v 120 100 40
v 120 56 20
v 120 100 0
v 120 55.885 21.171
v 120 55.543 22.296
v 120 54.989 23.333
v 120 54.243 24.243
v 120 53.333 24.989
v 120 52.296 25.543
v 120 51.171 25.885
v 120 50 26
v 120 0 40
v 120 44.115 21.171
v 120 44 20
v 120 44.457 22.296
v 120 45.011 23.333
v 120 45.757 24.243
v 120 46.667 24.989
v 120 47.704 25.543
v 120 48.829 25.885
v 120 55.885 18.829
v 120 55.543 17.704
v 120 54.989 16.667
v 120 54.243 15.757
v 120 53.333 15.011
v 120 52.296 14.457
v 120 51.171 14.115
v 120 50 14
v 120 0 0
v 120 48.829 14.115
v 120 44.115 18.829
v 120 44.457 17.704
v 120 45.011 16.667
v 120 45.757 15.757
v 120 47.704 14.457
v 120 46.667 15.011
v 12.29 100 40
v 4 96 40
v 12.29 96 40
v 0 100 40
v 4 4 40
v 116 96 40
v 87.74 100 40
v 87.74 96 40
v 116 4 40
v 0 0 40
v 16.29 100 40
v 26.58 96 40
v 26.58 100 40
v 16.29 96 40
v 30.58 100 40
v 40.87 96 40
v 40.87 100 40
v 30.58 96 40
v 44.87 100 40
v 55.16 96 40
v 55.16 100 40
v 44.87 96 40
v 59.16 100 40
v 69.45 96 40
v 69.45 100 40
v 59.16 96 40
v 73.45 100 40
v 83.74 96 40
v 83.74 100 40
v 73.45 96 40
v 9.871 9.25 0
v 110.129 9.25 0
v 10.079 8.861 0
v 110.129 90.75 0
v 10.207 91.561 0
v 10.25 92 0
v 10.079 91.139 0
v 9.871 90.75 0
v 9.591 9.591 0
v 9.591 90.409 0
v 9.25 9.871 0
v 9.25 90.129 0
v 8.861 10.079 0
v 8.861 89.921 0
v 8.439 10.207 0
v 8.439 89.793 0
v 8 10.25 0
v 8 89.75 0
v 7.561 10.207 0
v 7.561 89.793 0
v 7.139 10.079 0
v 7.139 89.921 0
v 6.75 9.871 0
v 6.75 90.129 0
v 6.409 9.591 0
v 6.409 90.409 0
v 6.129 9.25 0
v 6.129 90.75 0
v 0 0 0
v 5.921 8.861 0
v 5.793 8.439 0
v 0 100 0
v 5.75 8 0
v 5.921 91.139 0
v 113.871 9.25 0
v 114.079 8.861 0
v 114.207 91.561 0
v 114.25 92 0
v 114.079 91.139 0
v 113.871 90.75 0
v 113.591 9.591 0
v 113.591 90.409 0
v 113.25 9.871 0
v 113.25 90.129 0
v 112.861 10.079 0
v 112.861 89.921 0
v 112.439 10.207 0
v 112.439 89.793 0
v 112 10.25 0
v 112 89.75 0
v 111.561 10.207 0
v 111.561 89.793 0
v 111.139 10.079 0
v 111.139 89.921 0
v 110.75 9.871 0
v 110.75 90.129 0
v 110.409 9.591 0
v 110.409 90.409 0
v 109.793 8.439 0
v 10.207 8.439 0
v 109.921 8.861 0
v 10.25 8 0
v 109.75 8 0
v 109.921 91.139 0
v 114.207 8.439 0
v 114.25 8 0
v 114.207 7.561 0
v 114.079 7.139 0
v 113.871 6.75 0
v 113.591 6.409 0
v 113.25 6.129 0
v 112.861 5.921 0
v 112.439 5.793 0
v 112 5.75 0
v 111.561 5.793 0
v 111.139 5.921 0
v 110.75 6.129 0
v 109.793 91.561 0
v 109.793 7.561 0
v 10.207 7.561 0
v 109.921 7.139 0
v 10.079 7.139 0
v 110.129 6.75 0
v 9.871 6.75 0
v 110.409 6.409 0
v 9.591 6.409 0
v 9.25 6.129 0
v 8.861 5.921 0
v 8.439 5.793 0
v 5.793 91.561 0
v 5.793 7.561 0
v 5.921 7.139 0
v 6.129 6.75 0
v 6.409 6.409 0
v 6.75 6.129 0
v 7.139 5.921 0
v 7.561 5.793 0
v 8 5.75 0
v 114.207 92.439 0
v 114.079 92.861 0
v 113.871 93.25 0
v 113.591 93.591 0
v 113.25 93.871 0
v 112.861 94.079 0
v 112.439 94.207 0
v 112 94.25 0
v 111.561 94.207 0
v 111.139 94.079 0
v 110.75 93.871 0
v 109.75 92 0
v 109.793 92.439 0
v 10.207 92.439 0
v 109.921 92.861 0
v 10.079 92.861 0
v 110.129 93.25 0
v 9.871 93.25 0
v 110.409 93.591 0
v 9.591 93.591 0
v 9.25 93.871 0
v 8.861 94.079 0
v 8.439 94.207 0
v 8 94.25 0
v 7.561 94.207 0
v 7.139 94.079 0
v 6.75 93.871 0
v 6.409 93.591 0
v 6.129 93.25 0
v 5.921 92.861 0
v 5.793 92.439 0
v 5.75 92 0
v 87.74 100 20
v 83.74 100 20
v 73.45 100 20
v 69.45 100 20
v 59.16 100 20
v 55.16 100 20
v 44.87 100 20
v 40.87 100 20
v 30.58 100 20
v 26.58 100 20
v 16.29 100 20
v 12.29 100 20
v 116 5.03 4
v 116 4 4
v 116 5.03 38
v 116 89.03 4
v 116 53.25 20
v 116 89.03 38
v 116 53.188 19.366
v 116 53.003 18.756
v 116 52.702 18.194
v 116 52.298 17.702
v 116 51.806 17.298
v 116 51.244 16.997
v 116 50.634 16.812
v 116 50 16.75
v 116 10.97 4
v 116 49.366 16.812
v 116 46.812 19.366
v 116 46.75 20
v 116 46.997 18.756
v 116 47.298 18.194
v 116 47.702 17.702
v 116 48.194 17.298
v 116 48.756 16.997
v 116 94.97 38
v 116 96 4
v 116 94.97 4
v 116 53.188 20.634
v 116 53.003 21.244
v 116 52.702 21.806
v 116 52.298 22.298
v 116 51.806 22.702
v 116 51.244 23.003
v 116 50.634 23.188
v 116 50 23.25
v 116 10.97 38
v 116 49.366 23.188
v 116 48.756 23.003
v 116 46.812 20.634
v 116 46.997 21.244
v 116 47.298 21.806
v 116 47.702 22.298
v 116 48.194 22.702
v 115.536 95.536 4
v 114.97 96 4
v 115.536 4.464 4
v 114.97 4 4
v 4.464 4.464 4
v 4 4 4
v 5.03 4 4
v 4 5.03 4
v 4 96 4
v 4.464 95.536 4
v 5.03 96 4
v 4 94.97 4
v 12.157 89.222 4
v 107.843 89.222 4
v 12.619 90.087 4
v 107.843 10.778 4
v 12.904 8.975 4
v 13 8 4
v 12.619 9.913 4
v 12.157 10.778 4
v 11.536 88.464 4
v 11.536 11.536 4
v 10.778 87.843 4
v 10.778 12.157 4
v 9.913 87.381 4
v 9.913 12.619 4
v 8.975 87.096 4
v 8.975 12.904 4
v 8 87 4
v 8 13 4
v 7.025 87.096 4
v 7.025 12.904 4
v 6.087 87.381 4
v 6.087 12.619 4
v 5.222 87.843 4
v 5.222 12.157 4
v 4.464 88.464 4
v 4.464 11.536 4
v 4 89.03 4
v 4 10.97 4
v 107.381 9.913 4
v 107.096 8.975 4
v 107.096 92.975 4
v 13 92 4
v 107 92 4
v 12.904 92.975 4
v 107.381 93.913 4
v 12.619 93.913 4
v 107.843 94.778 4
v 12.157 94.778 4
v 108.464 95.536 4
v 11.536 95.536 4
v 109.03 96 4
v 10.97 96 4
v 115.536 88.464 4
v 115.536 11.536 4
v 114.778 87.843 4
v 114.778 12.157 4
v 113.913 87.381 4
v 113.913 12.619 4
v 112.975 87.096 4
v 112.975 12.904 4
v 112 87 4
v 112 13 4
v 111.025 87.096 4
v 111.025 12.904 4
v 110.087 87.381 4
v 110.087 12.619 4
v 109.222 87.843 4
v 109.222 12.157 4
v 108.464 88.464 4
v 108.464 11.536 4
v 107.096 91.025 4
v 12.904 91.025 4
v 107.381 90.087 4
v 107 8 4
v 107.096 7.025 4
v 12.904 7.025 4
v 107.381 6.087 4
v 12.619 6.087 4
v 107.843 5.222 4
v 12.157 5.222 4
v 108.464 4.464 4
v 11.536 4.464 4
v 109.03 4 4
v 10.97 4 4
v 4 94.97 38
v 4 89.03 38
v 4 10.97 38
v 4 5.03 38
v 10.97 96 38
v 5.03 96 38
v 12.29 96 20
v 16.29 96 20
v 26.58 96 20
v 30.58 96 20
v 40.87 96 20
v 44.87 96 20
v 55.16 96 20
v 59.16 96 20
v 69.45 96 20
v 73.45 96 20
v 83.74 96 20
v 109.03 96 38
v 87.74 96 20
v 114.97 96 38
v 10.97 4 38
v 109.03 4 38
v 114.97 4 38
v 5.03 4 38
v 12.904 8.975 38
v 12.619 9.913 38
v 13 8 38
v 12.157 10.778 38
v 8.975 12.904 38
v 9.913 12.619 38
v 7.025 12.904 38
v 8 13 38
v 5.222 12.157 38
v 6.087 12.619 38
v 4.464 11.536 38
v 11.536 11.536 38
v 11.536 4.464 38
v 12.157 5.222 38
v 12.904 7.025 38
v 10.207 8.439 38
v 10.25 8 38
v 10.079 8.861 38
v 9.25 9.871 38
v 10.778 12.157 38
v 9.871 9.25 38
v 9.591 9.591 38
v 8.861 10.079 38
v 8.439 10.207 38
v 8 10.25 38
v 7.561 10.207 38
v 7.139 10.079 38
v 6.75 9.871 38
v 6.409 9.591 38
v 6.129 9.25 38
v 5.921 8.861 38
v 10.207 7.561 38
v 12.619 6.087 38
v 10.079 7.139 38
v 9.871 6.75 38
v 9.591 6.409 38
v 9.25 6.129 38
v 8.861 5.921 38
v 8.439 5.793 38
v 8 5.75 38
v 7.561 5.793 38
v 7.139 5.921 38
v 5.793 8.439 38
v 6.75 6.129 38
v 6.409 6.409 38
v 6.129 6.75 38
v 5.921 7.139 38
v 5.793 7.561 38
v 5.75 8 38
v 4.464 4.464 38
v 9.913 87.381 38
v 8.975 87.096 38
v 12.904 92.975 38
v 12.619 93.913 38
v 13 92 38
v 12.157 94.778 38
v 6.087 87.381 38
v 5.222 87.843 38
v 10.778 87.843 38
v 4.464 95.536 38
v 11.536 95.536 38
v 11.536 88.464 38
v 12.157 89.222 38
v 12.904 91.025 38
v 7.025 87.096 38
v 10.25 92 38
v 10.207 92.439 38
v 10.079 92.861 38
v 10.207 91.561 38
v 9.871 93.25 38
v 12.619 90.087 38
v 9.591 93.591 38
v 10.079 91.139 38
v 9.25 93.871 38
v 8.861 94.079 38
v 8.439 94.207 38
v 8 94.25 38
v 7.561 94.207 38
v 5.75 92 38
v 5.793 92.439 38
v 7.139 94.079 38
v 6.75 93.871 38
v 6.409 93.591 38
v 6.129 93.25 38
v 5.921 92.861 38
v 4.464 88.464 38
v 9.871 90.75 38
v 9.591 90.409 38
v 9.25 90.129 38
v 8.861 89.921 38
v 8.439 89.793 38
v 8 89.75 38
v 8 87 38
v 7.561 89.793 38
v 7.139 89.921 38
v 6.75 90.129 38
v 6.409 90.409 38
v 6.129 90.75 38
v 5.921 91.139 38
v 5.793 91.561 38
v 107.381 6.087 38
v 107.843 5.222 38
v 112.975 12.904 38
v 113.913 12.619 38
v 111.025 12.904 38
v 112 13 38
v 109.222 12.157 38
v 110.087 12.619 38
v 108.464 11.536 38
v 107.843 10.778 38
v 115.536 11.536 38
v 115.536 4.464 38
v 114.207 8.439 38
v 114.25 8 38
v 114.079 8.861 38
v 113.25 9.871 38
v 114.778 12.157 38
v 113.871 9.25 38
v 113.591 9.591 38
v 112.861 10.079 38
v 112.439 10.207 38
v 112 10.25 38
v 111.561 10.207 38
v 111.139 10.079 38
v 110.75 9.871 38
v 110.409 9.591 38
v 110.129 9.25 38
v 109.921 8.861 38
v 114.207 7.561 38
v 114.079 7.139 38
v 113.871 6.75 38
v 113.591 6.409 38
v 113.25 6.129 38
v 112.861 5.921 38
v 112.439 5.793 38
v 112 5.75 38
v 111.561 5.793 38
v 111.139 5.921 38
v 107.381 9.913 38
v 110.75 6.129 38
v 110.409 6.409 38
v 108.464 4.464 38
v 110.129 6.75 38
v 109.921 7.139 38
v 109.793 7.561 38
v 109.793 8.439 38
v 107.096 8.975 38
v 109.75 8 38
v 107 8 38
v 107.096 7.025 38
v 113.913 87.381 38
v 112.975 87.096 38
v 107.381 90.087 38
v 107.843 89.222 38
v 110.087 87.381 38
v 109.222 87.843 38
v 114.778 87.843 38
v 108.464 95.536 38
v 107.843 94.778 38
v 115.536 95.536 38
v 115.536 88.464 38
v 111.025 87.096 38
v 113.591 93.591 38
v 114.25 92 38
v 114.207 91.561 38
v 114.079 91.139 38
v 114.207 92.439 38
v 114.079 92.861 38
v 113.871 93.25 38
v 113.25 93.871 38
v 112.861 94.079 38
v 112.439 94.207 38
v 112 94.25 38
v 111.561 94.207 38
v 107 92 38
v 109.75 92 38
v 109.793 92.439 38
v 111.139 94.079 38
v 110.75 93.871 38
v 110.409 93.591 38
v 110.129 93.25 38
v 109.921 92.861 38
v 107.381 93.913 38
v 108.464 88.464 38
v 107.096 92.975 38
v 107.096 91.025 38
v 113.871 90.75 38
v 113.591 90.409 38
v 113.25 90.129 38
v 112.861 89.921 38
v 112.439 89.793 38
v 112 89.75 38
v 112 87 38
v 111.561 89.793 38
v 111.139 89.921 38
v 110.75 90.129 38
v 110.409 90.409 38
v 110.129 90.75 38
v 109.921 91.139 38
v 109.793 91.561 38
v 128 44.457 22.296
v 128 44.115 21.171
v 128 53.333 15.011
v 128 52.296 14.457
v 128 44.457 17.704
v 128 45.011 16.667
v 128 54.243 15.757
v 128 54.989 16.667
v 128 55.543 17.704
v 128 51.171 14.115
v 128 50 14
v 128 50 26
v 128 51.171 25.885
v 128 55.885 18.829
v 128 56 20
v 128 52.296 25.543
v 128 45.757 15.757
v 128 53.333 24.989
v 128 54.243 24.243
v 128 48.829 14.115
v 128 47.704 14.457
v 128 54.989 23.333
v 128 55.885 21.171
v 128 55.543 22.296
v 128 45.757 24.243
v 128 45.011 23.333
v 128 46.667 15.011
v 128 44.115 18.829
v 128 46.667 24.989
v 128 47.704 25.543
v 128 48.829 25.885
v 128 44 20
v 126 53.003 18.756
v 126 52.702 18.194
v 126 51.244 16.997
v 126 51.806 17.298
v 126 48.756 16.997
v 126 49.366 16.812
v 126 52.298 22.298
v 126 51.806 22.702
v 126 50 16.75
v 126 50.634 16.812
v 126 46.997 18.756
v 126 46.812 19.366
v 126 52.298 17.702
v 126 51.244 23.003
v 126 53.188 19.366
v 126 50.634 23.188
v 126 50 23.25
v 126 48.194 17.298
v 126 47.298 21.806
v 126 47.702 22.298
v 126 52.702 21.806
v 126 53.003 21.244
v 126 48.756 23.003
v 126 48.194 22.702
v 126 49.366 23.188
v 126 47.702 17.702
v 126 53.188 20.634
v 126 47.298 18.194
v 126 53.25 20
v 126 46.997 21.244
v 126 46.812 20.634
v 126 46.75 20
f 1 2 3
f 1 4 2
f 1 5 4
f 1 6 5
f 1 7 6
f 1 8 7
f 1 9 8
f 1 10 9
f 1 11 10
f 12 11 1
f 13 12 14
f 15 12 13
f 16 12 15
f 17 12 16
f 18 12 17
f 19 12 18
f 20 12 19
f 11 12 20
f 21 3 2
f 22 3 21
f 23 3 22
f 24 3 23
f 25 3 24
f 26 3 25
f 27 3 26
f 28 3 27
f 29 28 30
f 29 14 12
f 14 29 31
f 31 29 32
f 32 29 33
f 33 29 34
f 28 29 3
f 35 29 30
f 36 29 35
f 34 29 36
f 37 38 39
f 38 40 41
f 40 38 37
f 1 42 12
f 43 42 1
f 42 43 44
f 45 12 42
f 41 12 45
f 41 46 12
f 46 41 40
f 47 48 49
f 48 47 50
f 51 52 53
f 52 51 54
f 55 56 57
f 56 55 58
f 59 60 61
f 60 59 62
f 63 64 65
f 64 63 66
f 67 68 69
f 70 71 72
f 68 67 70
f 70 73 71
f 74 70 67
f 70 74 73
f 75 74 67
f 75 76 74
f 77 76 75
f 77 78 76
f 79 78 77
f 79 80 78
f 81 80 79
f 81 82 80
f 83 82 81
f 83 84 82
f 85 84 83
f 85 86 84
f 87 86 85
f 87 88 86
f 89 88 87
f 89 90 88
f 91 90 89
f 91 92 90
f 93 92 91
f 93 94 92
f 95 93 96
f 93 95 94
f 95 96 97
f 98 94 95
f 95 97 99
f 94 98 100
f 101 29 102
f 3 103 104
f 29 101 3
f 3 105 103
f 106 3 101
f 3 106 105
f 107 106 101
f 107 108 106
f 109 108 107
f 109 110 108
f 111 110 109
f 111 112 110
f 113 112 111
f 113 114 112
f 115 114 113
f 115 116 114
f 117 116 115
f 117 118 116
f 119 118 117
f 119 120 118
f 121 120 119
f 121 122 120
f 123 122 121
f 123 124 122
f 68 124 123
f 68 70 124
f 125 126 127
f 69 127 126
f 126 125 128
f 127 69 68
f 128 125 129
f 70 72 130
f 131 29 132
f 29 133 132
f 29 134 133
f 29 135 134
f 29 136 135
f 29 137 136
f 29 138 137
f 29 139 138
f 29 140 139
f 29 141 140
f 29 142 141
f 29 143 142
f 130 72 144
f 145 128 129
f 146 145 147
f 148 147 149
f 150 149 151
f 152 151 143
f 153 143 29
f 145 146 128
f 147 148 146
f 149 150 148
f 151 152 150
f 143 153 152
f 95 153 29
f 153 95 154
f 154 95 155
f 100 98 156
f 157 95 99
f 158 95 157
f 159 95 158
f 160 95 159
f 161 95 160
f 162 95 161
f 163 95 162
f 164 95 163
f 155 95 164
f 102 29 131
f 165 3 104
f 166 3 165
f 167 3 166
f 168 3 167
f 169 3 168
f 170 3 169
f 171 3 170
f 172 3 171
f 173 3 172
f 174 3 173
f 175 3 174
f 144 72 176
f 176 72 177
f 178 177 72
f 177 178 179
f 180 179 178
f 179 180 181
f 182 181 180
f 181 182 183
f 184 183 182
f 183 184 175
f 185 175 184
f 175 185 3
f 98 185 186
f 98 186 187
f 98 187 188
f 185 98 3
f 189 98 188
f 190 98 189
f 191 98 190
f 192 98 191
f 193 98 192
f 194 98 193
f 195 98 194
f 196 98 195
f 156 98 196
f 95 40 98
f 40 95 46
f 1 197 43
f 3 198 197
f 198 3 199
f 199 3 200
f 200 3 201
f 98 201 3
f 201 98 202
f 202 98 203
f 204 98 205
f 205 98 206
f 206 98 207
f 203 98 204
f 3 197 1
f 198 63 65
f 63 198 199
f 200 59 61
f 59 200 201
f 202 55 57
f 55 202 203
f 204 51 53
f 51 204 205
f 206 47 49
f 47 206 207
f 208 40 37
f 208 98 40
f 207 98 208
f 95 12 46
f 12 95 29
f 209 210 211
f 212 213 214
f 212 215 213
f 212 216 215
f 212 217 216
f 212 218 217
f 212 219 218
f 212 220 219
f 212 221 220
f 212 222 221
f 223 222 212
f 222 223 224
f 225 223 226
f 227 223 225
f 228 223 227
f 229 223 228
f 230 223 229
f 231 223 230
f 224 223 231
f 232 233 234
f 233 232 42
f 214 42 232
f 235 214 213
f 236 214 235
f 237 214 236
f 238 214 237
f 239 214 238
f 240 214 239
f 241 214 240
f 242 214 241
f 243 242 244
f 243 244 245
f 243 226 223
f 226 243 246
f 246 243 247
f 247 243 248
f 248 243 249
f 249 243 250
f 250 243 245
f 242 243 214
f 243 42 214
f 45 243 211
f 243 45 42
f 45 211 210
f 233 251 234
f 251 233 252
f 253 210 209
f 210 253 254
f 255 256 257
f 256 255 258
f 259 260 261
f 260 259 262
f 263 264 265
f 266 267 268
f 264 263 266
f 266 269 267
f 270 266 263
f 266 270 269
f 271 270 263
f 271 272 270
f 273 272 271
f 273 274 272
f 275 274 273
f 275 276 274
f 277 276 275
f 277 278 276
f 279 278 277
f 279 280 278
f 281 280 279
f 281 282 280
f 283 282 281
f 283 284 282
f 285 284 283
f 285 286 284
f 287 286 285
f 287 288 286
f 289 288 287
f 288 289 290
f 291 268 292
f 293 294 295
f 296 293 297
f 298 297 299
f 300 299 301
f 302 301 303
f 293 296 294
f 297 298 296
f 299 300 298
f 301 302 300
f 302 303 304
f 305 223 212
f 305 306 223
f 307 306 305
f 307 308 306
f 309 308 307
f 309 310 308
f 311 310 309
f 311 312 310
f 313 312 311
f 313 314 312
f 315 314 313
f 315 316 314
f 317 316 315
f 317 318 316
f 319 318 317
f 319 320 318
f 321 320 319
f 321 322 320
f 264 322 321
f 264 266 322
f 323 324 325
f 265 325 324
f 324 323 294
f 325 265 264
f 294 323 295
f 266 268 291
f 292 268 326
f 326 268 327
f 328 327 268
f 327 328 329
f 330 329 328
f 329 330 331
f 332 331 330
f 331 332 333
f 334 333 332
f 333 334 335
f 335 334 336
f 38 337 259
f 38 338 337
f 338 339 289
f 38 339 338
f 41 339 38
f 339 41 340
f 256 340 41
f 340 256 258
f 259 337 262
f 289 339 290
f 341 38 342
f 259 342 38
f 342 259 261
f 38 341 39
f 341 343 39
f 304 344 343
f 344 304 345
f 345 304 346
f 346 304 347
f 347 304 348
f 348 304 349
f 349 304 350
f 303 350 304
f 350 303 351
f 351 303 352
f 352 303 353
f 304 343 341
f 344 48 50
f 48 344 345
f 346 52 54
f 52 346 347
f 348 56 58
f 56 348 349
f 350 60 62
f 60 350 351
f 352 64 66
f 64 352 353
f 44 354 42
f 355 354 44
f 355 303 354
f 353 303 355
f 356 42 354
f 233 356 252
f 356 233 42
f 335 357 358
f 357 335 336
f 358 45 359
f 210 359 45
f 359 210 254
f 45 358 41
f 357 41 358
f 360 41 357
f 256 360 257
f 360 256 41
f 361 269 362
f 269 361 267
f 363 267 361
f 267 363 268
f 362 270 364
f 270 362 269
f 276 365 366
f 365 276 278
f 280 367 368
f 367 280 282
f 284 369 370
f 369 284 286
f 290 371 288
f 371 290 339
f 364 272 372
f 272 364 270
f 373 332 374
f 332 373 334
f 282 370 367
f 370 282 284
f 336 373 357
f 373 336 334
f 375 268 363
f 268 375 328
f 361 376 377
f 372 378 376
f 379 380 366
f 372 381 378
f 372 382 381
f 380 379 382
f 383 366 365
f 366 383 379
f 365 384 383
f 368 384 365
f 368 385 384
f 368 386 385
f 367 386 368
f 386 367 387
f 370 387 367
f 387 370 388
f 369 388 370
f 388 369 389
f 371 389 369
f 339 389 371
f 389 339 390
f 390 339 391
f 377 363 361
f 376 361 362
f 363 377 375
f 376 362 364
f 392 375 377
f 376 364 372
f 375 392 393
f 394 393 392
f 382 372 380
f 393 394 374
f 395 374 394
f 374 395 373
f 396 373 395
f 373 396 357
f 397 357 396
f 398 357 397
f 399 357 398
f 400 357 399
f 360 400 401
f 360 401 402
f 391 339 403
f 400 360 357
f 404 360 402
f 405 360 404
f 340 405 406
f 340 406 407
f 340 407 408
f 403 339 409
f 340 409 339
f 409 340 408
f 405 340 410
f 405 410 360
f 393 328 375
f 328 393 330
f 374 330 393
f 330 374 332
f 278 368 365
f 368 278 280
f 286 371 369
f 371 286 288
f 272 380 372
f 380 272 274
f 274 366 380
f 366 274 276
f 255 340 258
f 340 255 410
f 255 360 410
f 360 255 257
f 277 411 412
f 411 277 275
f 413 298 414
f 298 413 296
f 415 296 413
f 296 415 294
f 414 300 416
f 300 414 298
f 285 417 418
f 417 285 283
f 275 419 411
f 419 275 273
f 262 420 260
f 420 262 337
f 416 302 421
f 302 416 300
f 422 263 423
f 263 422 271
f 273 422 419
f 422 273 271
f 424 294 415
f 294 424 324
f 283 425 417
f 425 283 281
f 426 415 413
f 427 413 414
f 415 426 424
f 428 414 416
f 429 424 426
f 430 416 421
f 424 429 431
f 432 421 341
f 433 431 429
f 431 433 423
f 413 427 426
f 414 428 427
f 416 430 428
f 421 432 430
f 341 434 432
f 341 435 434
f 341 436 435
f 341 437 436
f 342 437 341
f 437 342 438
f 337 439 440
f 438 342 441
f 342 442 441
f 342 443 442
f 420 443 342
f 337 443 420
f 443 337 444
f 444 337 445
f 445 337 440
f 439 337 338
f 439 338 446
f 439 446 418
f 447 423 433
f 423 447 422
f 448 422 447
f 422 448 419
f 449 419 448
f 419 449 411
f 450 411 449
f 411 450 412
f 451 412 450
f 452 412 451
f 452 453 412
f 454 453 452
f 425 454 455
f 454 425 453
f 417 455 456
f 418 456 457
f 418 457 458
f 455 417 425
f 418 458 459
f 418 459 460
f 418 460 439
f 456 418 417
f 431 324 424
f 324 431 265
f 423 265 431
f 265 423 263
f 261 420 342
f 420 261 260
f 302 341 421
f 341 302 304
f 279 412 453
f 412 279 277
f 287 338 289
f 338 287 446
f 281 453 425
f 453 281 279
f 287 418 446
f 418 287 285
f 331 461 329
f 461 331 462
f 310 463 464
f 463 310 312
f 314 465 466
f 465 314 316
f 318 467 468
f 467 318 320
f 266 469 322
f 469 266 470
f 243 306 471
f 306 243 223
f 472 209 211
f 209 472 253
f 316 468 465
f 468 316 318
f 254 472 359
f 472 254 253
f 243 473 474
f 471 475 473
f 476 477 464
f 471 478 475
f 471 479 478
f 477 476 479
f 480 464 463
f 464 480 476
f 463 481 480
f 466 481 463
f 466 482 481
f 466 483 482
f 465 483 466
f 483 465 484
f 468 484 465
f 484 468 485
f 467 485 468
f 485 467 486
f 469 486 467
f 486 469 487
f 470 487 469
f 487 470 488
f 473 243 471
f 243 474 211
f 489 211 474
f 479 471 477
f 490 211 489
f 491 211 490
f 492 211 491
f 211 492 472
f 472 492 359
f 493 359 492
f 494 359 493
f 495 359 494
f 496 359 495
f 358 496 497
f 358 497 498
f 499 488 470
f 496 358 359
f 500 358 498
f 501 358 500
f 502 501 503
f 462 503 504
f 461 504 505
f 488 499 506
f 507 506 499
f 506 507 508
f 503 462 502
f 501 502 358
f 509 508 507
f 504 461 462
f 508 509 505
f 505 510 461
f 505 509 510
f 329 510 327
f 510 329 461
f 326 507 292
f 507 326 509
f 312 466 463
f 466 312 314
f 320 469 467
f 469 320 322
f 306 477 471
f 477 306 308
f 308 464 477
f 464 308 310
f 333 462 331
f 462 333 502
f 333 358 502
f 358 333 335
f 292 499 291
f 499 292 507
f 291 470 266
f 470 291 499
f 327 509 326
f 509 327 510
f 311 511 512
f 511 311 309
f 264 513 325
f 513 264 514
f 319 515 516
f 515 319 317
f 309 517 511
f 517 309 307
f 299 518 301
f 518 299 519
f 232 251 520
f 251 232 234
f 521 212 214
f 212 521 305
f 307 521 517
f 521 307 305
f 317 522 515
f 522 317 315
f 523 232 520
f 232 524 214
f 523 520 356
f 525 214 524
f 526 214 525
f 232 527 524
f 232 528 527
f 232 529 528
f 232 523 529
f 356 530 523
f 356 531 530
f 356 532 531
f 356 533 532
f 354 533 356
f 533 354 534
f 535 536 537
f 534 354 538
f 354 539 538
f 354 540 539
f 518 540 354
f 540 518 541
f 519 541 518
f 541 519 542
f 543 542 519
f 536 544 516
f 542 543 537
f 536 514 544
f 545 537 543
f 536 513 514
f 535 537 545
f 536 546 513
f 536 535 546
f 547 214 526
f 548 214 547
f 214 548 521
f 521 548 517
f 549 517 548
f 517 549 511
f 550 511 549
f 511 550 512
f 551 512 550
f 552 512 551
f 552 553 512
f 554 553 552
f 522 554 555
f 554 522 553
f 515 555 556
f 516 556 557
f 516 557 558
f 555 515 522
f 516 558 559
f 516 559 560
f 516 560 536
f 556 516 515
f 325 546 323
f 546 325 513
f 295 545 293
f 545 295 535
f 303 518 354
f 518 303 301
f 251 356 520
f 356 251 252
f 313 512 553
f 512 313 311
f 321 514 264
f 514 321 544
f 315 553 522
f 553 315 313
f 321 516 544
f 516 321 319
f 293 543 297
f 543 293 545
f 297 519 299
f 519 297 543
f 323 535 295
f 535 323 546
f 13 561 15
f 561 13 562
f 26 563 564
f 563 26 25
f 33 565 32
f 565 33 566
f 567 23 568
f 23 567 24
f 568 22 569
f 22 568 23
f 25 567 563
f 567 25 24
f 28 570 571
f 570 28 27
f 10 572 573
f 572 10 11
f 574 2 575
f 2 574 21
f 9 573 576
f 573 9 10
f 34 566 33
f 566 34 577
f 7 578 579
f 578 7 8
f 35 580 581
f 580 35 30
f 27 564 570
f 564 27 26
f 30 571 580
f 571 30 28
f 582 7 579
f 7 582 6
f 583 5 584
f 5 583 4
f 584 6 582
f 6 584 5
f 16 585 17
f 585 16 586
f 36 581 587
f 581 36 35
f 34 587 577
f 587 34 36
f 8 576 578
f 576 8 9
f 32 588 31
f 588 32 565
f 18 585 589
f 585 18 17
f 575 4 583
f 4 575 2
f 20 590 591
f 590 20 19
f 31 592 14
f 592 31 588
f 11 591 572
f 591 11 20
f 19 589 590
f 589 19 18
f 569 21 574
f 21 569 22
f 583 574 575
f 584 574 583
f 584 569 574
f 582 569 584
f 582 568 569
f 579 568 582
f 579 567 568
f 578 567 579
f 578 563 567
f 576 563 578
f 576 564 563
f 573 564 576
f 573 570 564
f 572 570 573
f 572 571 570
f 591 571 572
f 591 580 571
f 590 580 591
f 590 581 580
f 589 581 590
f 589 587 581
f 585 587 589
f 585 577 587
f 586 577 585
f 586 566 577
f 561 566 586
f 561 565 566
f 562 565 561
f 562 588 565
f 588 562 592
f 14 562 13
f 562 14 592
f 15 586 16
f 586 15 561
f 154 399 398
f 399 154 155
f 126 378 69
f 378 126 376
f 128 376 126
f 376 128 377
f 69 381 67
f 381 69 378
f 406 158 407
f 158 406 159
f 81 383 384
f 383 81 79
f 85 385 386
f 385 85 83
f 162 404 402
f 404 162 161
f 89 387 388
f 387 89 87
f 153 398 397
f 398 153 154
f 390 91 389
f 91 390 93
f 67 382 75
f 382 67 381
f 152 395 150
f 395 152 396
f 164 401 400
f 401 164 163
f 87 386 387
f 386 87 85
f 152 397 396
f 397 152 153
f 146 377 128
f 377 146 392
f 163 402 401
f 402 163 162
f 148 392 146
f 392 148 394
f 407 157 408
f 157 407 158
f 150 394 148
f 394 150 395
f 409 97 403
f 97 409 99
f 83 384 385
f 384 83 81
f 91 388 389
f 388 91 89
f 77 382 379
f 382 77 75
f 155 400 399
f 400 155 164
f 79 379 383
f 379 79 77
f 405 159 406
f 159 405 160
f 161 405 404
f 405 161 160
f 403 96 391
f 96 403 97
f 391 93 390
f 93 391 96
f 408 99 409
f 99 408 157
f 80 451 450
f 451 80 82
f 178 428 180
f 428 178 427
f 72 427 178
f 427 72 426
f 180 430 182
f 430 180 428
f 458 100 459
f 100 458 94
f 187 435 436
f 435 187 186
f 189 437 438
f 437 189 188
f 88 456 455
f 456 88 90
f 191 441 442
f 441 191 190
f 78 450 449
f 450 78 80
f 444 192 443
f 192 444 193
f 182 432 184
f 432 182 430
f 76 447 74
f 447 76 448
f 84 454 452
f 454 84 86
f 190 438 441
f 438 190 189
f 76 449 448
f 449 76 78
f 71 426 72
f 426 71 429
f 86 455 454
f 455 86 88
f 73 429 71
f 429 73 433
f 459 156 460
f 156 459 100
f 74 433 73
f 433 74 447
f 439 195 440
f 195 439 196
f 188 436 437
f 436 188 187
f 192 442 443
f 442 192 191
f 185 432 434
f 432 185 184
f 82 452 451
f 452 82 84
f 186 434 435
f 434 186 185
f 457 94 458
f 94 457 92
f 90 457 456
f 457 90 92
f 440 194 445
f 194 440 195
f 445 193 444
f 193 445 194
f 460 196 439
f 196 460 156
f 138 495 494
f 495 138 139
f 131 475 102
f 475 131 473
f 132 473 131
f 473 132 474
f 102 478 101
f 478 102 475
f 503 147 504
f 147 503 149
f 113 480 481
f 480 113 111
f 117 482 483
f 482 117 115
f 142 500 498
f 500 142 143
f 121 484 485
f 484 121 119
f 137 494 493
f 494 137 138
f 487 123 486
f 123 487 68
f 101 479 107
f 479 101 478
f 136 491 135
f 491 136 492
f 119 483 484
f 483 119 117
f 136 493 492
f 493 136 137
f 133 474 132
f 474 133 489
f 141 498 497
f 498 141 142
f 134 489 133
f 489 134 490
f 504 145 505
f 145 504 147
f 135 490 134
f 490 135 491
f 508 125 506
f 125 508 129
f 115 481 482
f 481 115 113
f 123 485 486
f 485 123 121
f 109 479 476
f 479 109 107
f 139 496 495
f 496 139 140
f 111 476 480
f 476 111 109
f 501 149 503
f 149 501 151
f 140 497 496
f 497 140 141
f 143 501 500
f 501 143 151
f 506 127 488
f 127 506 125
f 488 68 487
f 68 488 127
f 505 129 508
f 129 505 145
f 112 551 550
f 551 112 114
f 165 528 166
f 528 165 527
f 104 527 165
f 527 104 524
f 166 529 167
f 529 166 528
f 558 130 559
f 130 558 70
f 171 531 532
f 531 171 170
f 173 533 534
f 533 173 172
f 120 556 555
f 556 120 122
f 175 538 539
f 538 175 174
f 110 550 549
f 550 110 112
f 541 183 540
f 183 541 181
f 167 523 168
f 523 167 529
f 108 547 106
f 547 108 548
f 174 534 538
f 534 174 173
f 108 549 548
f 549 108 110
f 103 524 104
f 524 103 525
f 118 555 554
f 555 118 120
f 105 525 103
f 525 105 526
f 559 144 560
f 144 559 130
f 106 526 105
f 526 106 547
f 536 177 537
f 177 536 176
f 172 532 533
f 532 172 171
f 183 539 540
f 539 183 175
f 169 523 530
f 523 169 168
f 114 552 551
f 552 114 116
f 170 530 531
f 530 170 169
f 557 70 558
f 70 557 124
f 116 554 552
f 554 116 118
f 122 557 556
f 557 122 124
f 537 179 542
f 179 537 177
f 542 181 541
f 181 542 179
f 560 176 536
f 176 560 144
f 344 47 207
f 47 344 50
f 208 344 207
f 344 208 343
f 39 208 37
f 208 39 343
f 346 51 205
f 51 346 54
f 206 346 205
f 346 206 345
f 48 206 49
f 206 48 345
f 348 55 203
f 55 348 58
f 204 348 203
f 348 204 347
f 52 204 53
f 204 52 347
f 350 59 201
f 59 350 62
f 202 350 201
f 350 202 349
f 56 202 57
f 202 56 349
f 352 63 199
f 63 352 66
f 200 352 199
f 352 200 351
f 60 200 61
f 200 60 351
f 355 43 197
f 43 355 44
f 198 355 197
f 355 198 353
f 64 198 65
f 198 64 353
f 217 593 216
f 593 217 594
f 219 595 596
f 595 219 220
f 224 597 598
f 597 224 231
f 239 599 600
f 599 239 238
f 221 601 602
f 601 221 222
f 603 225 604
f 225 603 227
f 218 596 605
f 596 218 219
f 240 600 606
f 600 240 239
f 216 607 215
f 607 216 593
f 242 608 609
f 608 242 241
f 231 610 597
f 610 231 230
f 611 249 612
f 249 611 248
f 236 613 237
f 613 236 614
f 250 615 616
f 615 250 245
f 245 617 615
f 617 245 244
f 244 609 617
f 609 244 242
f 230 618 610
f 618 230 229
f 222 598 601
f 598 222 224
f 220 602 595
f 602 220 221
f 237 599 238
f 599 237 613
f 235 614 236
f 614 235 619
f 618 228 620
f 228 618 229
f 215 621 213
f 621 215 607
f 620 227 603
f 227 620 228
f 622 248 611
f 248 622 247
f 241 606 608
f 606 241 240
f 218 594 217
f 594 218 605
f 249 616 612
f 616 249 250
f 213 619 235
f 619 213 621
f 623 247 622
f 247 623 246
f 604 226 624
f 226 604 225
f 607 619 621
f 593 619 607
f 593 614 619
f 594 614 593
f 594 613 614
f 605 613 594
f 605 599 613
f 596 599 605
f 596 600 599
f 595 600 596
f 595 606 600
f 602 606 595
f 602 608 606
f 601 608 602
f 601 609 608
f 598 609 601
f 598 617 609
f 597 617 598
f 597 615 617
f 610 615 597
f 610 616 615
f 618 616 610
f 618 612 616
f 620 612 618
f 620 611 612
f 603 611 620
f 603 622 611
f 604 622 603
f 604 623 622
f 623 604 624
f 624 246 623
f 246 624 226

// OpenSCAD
$fn = 32;

// ----------------------------------------------------------------------
// Enclosure body: 120 x 100 x 40 mm, wall 4 mm
// ----------------------------------------------------------------------

// --- parameters (mm) ---
length = 120;             // outside length, X
width = 100;              // outside width, Y
height = 40;              // outside height, Z
wall = 4;                 // side wall thickness
floor_t = 4;              // floor thickness
boss_d = 10;              // corner boss diameter
boss_h = 34;              // corner boss height above the floor
boss_hole_d = 4.5;        // lid screw clearance in the boss
boss_lip = 8;             // boss centre inset from the corner
vent_slots = 6;           // vent slots in the long wall
vent_w = 4;               // vent slot width
vent_h = 20;              // vent slot height
vent_pitch = 14.29;       // vent slot pitch
vent_z = 20;              // vent slot sill height
nipple_d = 12;            // cable gland boss diameter
nipple_h = 8;             // cable gland boss height
nipple_bore = 6.5;        // cable gland bore

module shell() {
  difference() {
    cube([length, width, height]);
    /* hollow, open at the top */
    translate([wall, wall, floor_t])
      cube([length - 2 * wall, width - 2 * wall, height]);
  }
}

module bosses() {
  /* corner bosses, sunk 1 mm into the floor */
  for (sx = [0, 1]) for (sy = [0, 1])
    translate([sx * (length - 2 * boss_lip) + boss_lip, sy * (width - 2 * boss_lip) + boss_lip, floor_t - 1])
      cylinder(h = boss_h + 1, d = boss_d);
}

module gland() {
  /* boss on the short wall, sunk 1 mm into it */
  translate([length - 1, width / 2, height * 0.5]) rotate([0, 90, 0])
    cylinder(h = nipple_h + 1, d = nipple_d);
}

difference() {
  union() {
    shell();
    bosses();
    gland();
  }
  /* boss screw holes */
  for (sx = [0, 1]) for (sy = [0, 1])
    translate([sx * (length - 2 * boss_lip) + boss_lip, sy * (width - 2 * boss_lip) + boss_lip, -1]) cylinder(h = floor_t + boss_h + 2, d = boss_hole_d);
  /* vent grille in the +Y wall */
  for (i = [0 : vent_slots - 1]) translate([vent_pitch * (i + 1) - vent_w / 2, width - wall - 1, vent_z]) cube([vent_w, wall + 2, vent_h]);
  translate([length, width / 2, height * 0.5]) rotate([0, 90, 0]) translate([0, 0, -nipple_h - 2]) cylinder(h = nipple_h + wall + 4, d = nipple_bore);
}
